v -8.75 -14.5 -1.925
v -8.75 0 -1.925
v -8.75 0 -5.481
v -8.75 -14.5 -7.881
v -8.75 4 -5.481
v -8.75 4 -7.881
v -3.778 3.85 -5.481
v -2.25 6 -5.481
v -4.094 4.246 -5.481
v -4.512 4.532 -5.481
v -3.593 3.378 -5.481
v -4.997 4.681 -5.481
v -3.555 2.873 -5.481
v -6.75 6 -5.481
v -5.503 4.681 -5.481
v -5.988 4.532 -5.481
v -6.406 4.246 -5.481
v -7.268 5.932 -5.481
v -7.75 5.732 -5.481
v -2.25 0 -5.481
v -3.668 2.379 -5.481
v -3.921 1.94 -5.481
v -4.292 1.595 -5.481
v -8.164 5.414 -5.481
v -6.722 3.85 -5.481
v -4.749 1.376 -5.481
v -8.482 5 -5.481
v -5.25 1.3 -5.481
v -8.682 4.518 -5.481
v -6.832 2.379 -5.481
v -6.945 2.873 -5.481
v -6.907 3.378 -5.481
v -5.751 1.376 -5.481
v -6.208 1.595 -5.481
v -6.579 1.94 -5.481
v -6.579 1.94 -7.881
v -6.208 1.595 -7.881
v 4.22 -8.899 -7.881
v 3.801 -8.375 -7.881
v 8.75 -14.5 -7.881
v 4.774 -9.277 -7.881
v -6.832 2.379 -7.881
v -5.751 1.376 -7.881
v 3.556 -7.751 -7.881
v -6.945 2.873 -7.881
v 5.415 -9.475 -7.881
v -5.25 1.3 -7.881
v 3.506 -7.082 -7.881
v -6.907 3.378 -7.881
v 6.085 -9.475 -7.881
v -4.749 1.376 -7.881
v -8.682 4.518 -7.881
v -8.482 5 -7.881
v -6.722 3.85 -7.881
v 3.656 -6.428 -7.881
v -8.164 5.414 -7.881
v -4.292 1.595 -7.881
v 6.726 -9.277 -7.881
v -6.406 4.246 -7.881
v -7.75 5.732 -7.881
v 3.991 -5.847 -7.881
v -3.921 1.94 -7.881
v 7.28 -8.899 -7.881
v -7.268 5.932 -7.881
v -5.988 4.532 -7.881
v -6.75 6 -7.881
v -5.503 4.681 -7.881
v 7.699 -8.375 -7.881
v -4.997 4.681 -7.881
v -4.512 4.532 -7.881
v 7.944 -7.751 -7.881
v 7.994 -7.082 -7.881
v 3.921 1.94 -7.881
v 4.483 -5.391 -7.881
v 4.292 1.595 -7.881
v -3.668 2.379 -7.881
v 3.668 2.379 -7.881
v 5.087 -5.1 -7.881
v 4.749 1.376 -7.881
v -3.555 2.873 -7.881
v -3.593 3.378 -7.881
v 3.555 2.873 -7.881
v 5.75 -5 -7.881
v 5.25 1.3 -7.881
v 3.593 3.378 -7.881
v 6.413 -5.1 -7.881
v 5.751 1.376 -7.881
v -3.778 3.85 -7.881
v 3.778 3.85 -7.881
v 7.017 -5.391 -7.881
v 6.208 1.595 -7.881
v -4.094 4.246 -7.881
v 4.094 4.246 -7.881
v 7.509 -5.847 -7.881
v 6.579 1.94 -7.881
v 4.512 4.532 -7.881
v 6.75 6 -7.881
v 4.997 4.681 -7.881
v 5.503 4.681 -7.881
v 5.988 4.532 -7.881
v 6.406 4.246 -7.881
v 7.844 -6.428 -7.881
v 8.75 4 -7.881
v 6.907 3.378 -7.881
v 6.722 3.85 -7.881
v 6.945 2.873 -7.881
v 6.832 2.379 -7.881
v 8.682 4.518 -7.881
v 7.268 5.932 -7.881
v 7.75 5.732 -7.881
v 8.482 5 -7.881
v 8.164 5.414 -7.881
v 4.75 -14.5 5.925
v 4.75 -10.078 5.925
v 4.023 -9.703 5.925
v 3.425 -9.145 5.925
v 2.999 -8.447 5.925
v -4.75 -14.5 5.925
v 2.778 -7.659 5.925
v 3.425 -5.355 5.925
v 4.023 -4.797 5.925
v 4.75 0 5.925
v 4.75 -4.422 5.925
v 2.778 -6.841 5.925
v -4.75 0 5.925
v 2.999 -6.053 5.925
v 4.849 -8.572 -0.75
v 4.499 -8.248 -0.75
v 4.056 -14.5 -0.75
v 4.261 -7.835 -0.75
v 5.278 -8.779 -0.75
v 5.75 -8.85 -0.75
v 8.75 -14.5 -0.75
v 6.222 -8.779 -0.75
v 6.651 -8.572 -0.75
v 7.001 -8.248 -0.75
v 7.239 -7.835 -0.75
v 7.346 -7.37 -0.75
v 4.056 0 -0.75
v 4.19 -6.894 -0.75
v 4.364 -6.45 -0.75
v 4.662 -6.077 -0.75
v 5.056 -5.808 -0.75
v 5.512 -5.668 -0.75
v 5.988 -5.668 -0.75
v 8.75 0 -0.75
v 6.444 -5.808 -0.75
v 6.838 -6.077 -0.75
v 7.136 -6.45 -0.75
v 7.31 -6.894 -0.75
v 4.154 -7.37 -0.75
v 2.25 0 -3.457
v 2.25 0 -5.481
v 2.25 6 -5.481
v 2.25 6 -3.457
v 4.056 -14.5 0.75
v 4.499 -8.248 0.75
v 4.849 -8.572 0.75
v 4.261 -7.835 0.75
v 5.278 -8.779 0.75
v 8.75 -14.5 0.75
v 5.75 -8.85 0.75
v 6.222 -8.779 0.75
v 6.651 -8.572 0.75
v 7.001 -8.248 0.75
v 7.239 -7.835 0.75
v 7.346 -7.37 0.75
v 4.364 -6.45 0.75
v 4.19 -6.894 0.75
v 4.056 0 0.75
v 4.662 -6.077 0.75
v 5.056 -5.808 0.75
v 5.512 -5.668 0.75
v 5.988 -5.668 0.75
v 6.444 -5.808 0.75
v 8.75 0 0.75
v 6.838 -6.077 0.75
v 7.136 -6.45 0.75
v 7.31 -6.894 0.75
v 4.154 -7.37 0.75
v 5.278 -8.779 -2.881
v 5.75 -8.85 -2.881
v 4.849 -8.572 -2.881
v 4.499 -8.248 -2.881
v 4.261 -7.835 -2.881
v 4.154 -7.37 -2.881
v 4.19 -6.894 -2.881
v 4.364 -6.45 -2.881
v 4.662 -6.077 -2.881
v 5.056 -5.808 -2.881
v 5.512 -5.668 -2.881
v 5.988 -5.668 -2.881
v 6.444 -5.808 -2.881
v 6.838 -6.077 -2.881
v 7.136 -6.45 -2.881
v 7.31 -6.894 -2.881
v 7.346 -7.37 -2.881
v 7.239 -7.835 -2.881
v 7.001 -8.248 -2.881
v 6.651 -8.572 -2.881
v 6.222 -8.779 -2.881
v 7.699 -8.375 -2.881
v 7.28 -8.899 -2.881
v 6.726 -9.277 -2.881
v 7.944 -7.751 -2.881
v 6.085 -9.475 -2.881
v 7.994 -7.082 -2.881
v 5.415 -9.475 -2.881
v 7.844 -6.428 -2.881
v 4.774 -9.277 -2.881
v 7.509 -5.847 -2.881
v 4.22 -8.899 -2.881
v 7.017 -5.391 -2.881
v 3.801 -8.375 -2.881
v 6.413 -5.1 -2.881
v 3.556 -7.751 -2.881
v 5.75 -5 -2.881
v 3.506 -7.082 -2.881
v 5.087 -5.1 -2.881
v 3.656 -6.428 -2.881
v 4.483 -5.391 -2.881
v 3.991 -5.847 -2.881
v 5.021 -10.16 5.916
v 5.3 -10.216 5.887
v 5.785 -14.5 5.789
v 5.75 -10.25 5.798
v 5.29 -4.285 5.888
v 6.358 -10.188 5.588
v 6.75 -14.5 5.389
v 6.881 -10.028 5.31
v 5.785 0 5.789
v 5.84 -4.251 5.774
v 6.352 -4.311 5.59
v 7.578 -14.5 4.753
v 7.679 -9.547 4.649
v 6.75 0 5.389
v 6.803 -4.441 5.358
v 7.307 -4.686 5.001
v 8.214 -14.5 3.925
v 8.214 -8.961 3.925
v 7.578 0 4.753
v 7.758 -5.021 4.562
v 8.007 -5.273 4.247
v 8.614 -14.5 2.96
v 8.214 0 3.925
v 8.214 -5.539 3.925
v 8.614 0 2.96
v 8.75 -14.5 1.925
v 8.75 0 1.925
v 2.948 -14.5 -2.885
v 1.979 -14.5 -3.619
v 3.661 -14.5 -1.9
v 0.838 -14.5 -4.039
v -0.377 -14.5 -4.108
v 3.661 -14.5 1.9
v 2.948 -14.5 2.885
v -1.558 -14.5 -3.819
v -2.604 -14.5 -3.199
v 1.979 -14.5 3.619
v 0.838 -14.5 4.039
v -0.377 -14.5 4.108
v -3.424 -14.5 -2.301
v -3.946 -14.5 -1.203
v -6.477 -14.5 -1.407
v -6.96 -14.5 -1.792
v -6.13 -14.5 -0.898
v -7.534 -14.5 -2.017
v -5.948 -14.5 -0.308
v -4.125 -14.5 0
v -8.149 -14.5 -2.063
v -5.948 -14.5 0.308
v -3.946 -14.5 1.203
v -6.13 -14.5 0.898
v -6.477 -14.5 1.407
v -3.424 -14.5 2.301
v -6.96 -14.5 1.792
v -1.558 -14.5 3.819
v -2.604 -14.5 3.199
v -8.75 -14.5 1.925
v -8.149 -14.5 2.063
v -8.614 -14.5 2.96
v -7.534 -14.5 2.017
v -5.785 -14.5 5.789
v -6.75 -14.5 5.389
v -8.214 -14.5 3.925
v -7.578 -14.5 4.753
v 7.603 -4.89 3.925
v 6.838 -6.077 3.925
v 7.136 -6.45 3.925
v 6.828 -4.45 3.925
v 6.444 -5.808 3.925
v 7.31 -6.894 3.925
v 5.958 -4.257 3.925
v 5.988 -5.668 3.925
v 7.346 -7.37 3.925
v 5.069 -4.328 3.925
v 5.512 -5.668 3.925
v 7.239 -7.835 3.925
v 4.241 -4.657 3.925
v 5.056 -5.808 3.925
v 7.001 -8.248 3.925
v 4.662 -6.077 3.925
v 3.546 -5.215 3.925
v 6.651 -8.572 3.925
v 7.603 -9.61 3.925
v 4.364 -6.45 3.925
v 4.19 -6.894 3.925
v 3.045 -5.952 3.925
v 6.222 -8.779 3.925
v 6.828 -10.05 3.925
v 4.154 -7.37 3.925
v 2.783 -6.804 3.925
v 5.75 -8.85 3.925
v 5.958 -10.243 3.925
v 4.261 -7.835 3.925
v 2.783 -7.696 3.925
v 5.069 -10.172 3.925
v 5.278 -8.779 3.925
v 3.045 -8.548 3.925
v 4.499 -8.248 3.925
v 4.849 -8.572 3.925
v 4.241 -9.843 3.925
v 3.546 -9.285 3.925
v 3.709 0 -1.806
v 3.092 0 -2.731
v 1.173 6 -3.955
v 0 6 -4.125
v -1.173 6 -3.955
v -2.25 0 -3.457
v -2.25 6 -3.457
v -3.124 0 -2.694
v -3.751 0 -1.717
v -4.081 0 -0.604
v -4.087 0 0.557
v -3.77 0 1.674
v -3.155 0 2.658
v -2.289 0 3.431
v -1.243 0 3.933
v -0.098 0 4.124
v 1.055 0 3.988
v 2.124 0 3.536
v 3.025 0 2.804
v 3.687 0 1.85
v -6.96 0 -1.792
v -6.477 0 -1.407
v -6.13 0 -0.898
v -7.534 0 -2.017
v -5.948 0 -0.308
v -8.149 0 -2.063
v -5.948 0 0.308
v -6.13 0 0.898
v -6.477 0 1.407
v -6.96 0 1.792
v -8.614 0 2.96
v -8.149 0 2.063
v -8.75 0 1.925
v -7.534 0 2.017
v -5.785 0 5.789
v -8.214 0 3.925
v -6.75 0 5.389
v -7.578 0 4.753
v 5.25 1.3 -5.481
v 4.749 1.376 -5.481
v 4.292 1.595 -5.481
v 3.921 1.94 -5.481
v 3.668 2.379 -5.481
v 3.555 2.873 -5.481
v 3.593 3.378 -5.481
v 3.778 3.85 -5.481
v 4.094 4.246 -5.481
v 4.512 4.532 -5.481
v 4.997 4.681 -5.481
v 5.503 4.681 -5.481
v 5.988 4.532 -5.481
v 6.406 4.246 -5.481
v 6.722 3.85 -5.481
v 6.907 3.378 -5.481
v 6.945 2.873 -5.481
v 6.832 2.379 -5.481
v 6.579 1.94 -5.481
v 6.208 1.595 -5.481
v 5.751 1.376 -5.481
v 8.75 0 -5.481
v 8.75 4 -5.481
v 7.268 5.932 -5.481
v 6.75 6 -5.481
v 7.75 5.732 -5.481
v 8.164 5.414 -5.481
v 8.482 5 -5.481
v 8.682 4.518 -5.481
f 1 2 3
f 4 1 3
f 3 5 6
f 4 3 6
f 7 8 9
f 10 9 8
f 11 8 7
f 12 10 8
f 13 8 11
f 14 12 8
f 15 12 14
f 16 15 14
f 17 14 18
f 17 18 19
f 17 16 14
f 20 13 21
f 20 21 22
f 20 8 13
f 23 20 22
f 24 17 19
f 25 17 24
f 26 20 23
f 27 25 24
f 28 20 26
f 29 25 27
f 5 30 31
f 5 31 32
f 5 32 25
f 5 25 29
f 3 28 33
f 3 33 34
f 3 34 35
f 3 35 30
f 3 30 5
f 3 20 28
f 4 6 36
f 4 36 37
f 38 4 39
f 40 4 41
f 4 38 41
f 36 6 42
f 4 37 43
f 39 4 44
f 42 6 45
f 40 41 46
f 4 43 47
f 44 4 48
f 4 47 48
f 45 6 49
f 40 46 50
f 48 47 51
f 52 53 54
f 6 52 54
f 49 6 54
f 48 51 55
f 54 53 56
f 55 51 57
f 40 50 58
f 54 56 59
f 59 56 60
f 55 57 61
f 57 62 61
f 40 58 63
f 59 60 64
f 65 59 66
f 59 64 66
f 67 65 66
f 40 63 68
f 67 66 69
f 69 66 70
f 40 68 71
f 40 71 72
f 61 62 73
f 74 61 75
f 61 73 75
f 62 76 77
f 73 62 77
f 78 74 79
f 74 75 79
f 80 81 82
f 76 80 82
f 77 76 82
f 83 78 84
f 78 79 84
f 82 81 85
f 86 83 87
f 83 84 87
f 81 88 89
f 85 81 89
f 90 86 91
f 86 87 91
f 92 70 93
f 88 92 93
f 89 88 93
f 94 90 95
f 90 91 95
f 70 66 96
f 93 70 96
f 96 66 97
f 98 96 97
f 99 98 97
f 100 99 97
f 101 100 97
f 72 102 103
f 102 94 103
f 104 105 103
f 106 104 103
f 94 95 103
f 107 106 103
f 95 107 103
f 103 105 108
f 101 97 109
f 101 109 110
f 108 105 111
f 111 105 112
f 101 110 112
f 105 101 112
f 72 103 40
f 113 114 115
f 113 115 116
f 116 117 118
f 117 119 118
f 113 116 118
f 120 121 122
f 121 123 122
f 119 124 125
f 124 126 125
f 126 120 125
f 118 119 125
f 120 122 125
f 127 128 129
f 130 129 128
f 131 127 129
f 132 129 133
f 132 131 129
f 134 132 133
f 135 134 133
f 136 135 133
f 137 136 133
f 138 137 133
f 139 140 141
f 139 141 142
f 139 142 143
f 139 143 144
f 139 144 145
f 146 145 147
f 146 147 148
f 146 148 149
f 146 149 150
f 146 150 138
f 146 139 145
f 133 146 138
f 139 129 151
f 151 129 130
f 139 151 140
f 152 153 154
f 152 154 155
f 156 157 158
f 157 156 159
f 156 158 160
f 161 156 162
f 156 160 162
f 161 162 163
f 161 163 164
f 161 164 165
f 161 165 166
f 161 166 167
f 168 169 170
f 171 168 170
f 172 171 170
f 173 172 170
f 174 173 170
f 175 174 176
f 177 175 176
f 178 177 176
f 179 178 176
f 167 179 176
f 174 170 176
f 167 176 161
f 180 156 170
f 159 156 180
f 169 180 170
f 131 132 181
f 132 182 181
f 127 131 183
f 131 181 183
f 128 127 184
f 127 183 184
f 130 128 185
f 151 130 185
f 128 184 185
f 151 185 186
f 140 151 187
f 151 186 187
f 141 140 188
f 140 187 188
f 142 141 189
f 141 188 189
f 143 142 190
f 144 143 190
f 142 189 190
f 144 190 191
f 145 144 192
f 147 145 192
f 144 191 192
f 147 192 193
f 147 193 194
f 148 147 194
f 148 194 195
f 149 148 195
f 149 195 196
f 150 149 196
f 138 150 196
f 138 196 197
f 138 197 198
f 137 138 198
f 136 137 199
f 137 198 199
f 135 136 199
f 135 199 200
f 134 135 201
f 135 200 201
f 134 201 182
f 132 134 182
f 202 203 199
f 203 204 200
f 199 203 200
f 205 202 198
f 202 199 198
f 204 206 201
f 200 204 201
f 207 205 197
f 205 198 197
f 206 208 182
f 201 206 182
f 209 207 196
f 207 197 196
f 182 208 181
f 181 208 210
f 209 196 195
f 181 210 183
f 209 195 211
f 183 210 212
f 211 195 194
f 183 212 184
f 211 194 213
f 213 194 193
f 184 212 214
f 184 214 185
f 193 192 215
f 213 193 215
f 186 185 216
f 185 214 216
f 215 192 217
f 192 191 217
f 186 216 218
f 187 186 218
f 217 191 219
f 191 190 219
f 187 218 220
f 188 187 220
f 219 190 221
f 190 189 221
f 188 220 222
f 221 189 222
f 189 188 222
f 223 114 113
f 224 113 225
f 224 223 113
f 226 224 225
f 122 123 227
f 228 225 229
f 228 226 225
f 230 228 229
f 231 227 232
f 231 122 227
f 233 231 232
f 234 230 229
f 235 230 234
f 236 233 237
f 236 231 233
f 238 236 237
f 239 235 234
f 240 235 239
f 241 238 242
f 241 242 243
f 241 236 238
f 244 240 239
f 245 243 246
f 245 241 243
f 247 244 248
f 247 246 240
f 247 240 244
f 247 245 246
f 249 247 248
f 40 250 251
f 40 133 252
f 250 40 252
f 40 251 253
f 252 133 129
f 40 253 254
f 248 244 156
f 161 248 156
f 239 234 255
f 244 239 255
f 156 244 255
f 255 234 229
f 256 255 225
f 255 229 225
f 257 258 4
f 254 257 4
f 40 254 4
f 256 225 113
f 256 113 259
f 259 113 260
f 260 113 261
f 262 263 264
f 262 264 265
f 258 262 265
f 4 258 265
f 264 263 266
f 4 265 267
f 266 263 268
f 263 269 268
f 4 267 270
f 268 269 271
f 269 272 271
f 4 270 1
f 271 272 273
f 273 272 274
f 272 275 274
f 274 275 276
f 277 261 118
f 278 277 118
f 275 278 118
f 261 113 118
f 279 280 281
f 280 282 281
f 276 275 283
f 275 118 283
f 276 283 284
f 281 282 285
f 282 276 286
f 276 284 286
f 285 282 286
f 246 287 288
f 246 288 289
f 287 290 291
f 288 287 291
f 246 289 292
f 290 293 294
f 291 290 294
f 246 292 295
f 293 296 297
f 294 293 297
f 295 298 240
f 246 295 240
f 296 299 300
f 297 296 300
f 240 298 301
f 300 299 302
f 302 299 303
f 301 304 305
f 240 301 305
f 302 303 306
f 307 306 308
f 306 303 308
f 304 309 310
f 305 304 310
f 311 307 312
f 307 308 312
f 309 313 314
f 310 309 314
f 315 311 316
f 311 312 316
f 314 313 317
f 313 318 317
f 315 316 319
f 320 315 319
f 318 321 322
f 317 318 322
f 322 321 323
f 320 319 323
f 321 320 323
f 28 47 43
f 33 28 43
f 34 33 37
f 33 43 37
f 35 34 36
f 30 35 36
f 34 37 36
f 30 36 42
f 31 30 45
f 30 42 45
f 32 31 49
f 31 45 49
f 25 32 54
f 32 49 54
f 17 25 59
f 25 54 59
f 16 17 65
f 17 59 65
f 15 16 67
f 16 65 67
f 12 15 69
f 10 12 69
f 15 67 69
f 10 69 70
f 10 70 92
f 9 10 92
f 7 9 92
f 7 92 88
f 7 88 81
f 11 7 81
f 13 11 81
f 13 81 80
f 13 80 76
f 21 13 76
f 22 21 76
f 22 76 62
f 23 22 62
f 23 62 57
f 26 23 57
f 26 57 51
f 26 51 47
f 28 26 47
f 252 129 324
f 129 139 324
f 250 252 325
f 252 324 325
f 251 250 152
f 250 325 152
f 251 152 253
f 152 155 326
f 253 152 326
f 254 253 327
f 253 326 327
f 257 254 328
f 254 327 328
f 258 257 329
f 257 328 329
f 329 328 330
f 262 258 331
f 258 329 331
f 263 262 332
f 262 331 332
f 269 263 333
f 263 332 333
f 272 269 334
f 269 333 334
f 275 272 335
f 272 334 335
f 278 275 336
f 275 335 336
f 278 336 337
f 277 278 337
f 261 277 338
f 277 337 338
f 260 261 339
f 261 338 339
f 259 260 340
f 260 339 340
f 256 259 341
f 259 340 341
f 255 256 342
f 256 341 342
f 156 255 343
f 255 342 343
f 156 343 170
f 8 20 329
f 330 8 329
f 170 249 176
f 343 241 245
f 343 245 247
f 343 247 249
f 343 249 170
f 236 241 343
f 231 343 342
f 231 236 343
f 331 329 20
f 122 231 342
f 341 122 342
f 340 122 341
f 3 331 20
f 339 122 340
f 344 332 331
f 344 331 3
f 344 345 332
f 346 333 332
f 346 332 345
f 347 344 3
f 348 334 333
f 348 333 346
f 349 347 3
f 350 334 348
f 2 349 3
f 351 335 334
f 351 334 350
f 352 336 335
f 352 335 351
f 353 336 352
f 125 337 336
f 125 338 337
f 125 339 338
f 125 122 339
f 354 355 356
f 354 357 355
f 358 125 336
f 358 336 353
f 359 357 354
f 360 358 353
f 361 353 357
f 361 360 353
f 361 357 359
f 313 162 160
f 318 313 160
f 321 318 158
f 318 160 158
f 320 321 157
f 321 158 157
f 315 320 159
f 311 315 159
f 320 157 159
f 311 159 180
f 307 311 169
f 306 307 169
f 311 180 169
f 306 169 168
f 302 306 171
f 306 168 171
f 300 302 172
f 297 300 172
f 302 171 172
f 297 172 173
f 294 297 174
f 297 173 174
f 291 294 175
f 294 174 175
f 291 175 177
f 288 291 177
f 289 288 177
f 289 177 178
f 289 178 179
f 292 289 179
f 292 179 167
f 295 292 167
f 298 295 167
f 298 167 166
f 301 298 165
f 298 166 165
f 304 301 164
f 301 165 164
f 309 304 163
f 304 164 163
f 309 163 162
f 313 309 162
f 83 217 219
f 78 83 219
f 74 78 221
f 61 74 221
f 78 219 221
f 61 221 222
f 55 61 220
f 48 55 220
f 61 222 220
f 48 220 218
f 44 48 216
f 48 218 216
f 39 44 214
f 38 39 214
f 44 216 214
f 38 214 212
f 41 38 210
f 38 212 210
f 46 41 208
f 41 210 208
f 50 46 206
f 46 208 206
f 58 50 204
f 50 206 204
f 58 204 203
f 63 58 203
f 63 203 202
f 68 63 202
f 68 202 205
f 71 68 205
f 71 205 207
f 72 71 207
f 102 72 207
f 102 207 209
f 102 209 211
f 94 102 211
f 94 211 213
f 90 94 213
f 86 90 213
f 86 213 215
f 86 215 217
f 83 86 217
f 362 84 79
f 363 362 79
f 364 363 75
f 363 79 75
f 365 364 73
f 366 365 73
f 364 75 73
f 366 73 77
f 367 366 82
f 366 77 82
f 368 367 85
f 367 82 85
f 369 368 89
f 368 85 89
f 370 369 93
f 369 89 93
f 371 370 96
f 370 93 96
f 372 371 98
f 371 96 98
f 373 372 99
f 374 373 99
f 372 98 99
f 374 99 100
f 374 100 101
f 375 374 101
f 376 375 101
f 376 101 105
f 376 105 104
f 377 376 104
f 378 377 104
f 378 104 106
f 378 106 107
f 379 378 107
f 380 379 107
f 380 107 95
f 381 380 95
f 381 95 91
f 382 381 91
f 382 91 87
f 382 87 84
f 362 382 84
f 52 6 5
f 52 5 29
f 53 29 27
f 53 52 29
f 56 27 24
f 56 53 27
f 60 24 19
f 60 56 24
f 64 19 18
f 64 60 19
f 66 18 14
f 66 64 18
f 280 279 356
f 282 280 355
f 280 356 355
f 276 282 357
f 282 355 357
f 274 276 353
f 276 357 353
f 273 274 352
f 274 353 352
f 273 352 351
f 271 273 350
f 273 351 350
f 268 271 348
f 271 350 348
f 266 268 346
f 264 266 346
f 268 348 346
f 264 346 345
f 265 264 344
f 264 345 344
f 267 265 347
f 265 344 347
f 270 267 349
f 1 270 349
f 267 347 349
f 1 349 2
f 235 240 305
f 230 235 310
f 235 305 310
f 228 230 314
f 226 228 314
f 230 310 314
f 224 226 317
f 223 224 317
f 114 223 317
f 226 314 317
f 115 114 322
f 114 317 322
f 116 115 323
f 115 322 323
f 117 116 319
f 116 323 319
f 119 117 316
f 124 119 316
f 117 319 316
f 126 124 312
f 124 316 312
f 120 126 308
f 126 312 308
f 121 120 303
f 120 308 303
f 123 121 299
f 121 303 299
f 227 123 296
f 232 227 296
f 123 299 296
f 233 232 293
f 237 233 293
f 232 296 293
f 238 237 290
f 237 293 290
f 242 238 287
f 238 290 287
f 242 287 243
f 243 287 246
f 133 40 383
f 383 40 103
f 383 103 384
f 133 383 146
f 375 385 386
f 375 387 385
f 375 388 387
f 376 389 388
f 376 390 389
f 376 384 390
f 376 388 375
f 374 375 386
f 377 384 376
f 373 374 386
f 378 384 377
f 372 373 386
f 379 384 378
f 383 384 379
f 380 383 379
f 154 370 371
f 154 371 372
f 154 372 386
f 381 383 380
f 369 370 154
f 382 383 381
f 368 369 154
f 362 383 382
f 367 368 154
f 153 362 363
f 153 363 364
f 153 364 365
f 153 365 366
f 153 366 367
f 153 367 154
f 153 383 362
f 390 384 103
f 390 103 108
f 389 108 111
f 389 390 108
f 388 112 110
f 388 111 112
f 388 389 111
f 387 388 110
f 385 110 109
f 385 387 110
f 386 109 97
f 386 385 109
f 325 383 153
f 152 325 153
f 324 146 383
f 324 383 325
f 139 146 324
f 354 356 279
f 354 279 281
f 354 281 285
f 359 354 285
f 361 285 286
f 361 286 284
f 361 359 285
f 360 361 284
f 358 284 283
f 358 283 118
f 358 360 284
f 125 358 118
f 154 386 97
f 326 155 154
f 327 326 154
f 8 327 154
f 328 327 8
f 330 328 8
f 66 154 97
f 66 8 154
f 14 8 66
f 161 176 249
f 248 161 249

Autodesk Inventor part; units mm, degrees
ref_plane "YZ Plane" through (0, 0, 0) normal (1, 0, 0) x (0, 1, 0)
ref_plane "XZ Plane" through (0, 0, 0) normal (0, 1, 0) x (-1, 0, 0)
ref_plane "XY Plane" through (0, 0, 0) normal (0, 0, 1) x (1, 0, 0)
sketch "Skizze2" plane through (0, 0, 0) normal (0, 1, 0) x (-1, 0, 0)
  arc A0 (-4.0562, -0.75) -> (-4.0562, 0.75) centre (0, 0) ccw
  line L0 (8.75, -7.8806) -> (-8.75, -7.8806)
  line L1 (-8.75, -7.8806) -> (-8.75, 5.925)
  line L2 (-8.75, 5.925) -> (8.75, 5.925)
  line L3 (8.75, 5.925) -> (8.75, -7.8806)
  line L4 (8.75, -4.6225) -> (8.75, -1.5) projected
  arc A1 (8.75, 1.925) -> (8.75, -1.925) centre (7.9934, 0) ccw
  line L5 (8.75, -7.8806) -> (-8.75, -7.8806)
  line L6 (-8.75, -7.8806) -> (-8.75, -5.4806)
  line L7 (-8.75, -5.4806) -> (8.75, -5.4806)
  line L8 (8.75, -5.4806) -> (8.75, -7.8806)
  line L9 (2.25, -5.4806) -> (2.25, -3.4573)
  line L10 (-2.25, -5.4806) -> (-2.25, -3.4573)
  arc A2 (-2.25, -3.4573) -> (2.25, -3.4573) centre (0, 0) ccw
  line L11 (2.25, -5.4806) -> (-2.25, -5.4806)
  line L12 (-4.0562, -0.75) -> (-8.75, -0.75)
  line L13 (-4.0562, 0.75) -> (-8.75, 0.75)
  arc A3 (8.75, 1.925) -> (4.75, 5.925) centre (4.75, 1.925) ccw
  arc A4 (-4.75, 5.925) -> (-8.75, 1.925) centre (-4.75, 1.925) ccw
  line L14 (0, -10.8073) -> (0, 9.6802) construction
  line L15 (8.75, 0) -> (-8.75, 0) construction
  point P0 (5.25, -5.4806)
  point P1 (-5.25, -5.4806)
  dimension "d0" = 8.25
  dimension "d2" = 17.5
  dimension "d4" = 1.8
  dimension "d7" = 2.4
  dimension "d8" = 1.5
  dimension "d10" = 4
  dimension "d11" = 10.5
  dimension "d12" = 3
  dimension "d38" = 1.8
  dimension "d39" = 1.3556
extrude "Extrusion2" add sketch "Skizze2" against normal blind 14.5 contours A0 L10 L7 L1 L12 | A0 L9 L7 L10 | A0 L13 L1 A4 L2 A3 A1 L3 L7 L9 | L7 L3 L0 L1
extrude "Extrusion3" add sketch "Skizze2" along normal blind 6 contours A0 L9 L7 L10 | L7 L3 L0 L1
sketch "Skizze3" plane through (-8.75, 0, -5.4806) normal (0, 0, 1) x (1, 0, 0)
  line L0 (0, -14.5) -> (0, 0) projected
  line L1 (0, 0) -> (0, 6) projected
  line L2 (0, 6) -> (6.5, 6) projected
  line L3 (6.5, 6) -> (11, 6) projected
  line L4 (11, 6) -> (11, 0) projected
  line L5 (11, 0) -> (17.5, 0) projected
  line L6 (17.5, 6) -> (17.5, 0) projected
  line L7 (11, 6) -> (17.5, 6) projected
  line L8 (17.5, -14.5) -> (0, -14.5) projected
  line L9 (17.5, 0) -> (17.5, -14.5) projected
  line L10 (0, 0) -> (6.5, 0) projected
  line L11 (6.5, 0) -> (6.5, 6) projected
  line L12 (3.5, 0) -> (3.5, 6) construction
  line L13 (0, 6) -> (6.5, 6) projected
  line L14 (14, 0) -> (14, 6) construction
  line L15 (11, 6) -> (17.5, 6) projected
  point P0 (8.75, 0)
  point P1 (3.5, 3)
  point P2 (14, 3)
hole "Bohrung1" at (-5.25, 3, -5.4806) at (5.25, 3, -5.4806) direction (0, 0, -1) diameter 3.4 end through all clearance for "Inbusschraube DIN EN ISO 4762" size "M3" standard "DIN"
fillet "Rundung1" radius 2 2 edges at (-8.75, 6, -6.6806) (8.75, 6, -6.6806)
sketch "Skizze4" plane through (-4.75, 0, 5.925) normal (0, 0, 1) x (1, 0, 0)
  line L0 (8.8062, 0) -> (13.5, 0) projected
  line L1 (8.8062, 0) -> (8.8062, -14.5) projected
  line L2 (13.5, -14.5) -> (8.8062, -14.5) projected
  line L3 (13.5, 0) -> (13.5, -14.5) projected
  line L4 (13.5, 0) -> (9.5, 0) projected
  line L5 (10.5, -14.5) -> (10.5, 0) construction
  point P0 (4.75, 0)
  point P1 (10.5, -7.25)
  dimension "d30" = 3
hole "Bohrung2" at (5.75, -7.25, 5.925) direction (0, 0, -1) diameter 3.2 end through all counterbore diameter 6 counterbore depth 2 clearance for "Inbusschraube DIN EN ISO 4762" size "M3" standard "DIN"
sketch "Skizze5" plane through (8.75, -14.5, -7.8806) normal (0, 0, -1) x (-1, 0, 0)
  circle A0 centre (3, 7.25) radius 1.6 projected
  point P0 (8.75, 14.5)
hole "Bohrung3" at (5.75, -7.25, -7.8806) direction (0, 0, 1) diameter 4.5 depth 5
properties part number "Vinda_Mount_v2" material "Stahl"
